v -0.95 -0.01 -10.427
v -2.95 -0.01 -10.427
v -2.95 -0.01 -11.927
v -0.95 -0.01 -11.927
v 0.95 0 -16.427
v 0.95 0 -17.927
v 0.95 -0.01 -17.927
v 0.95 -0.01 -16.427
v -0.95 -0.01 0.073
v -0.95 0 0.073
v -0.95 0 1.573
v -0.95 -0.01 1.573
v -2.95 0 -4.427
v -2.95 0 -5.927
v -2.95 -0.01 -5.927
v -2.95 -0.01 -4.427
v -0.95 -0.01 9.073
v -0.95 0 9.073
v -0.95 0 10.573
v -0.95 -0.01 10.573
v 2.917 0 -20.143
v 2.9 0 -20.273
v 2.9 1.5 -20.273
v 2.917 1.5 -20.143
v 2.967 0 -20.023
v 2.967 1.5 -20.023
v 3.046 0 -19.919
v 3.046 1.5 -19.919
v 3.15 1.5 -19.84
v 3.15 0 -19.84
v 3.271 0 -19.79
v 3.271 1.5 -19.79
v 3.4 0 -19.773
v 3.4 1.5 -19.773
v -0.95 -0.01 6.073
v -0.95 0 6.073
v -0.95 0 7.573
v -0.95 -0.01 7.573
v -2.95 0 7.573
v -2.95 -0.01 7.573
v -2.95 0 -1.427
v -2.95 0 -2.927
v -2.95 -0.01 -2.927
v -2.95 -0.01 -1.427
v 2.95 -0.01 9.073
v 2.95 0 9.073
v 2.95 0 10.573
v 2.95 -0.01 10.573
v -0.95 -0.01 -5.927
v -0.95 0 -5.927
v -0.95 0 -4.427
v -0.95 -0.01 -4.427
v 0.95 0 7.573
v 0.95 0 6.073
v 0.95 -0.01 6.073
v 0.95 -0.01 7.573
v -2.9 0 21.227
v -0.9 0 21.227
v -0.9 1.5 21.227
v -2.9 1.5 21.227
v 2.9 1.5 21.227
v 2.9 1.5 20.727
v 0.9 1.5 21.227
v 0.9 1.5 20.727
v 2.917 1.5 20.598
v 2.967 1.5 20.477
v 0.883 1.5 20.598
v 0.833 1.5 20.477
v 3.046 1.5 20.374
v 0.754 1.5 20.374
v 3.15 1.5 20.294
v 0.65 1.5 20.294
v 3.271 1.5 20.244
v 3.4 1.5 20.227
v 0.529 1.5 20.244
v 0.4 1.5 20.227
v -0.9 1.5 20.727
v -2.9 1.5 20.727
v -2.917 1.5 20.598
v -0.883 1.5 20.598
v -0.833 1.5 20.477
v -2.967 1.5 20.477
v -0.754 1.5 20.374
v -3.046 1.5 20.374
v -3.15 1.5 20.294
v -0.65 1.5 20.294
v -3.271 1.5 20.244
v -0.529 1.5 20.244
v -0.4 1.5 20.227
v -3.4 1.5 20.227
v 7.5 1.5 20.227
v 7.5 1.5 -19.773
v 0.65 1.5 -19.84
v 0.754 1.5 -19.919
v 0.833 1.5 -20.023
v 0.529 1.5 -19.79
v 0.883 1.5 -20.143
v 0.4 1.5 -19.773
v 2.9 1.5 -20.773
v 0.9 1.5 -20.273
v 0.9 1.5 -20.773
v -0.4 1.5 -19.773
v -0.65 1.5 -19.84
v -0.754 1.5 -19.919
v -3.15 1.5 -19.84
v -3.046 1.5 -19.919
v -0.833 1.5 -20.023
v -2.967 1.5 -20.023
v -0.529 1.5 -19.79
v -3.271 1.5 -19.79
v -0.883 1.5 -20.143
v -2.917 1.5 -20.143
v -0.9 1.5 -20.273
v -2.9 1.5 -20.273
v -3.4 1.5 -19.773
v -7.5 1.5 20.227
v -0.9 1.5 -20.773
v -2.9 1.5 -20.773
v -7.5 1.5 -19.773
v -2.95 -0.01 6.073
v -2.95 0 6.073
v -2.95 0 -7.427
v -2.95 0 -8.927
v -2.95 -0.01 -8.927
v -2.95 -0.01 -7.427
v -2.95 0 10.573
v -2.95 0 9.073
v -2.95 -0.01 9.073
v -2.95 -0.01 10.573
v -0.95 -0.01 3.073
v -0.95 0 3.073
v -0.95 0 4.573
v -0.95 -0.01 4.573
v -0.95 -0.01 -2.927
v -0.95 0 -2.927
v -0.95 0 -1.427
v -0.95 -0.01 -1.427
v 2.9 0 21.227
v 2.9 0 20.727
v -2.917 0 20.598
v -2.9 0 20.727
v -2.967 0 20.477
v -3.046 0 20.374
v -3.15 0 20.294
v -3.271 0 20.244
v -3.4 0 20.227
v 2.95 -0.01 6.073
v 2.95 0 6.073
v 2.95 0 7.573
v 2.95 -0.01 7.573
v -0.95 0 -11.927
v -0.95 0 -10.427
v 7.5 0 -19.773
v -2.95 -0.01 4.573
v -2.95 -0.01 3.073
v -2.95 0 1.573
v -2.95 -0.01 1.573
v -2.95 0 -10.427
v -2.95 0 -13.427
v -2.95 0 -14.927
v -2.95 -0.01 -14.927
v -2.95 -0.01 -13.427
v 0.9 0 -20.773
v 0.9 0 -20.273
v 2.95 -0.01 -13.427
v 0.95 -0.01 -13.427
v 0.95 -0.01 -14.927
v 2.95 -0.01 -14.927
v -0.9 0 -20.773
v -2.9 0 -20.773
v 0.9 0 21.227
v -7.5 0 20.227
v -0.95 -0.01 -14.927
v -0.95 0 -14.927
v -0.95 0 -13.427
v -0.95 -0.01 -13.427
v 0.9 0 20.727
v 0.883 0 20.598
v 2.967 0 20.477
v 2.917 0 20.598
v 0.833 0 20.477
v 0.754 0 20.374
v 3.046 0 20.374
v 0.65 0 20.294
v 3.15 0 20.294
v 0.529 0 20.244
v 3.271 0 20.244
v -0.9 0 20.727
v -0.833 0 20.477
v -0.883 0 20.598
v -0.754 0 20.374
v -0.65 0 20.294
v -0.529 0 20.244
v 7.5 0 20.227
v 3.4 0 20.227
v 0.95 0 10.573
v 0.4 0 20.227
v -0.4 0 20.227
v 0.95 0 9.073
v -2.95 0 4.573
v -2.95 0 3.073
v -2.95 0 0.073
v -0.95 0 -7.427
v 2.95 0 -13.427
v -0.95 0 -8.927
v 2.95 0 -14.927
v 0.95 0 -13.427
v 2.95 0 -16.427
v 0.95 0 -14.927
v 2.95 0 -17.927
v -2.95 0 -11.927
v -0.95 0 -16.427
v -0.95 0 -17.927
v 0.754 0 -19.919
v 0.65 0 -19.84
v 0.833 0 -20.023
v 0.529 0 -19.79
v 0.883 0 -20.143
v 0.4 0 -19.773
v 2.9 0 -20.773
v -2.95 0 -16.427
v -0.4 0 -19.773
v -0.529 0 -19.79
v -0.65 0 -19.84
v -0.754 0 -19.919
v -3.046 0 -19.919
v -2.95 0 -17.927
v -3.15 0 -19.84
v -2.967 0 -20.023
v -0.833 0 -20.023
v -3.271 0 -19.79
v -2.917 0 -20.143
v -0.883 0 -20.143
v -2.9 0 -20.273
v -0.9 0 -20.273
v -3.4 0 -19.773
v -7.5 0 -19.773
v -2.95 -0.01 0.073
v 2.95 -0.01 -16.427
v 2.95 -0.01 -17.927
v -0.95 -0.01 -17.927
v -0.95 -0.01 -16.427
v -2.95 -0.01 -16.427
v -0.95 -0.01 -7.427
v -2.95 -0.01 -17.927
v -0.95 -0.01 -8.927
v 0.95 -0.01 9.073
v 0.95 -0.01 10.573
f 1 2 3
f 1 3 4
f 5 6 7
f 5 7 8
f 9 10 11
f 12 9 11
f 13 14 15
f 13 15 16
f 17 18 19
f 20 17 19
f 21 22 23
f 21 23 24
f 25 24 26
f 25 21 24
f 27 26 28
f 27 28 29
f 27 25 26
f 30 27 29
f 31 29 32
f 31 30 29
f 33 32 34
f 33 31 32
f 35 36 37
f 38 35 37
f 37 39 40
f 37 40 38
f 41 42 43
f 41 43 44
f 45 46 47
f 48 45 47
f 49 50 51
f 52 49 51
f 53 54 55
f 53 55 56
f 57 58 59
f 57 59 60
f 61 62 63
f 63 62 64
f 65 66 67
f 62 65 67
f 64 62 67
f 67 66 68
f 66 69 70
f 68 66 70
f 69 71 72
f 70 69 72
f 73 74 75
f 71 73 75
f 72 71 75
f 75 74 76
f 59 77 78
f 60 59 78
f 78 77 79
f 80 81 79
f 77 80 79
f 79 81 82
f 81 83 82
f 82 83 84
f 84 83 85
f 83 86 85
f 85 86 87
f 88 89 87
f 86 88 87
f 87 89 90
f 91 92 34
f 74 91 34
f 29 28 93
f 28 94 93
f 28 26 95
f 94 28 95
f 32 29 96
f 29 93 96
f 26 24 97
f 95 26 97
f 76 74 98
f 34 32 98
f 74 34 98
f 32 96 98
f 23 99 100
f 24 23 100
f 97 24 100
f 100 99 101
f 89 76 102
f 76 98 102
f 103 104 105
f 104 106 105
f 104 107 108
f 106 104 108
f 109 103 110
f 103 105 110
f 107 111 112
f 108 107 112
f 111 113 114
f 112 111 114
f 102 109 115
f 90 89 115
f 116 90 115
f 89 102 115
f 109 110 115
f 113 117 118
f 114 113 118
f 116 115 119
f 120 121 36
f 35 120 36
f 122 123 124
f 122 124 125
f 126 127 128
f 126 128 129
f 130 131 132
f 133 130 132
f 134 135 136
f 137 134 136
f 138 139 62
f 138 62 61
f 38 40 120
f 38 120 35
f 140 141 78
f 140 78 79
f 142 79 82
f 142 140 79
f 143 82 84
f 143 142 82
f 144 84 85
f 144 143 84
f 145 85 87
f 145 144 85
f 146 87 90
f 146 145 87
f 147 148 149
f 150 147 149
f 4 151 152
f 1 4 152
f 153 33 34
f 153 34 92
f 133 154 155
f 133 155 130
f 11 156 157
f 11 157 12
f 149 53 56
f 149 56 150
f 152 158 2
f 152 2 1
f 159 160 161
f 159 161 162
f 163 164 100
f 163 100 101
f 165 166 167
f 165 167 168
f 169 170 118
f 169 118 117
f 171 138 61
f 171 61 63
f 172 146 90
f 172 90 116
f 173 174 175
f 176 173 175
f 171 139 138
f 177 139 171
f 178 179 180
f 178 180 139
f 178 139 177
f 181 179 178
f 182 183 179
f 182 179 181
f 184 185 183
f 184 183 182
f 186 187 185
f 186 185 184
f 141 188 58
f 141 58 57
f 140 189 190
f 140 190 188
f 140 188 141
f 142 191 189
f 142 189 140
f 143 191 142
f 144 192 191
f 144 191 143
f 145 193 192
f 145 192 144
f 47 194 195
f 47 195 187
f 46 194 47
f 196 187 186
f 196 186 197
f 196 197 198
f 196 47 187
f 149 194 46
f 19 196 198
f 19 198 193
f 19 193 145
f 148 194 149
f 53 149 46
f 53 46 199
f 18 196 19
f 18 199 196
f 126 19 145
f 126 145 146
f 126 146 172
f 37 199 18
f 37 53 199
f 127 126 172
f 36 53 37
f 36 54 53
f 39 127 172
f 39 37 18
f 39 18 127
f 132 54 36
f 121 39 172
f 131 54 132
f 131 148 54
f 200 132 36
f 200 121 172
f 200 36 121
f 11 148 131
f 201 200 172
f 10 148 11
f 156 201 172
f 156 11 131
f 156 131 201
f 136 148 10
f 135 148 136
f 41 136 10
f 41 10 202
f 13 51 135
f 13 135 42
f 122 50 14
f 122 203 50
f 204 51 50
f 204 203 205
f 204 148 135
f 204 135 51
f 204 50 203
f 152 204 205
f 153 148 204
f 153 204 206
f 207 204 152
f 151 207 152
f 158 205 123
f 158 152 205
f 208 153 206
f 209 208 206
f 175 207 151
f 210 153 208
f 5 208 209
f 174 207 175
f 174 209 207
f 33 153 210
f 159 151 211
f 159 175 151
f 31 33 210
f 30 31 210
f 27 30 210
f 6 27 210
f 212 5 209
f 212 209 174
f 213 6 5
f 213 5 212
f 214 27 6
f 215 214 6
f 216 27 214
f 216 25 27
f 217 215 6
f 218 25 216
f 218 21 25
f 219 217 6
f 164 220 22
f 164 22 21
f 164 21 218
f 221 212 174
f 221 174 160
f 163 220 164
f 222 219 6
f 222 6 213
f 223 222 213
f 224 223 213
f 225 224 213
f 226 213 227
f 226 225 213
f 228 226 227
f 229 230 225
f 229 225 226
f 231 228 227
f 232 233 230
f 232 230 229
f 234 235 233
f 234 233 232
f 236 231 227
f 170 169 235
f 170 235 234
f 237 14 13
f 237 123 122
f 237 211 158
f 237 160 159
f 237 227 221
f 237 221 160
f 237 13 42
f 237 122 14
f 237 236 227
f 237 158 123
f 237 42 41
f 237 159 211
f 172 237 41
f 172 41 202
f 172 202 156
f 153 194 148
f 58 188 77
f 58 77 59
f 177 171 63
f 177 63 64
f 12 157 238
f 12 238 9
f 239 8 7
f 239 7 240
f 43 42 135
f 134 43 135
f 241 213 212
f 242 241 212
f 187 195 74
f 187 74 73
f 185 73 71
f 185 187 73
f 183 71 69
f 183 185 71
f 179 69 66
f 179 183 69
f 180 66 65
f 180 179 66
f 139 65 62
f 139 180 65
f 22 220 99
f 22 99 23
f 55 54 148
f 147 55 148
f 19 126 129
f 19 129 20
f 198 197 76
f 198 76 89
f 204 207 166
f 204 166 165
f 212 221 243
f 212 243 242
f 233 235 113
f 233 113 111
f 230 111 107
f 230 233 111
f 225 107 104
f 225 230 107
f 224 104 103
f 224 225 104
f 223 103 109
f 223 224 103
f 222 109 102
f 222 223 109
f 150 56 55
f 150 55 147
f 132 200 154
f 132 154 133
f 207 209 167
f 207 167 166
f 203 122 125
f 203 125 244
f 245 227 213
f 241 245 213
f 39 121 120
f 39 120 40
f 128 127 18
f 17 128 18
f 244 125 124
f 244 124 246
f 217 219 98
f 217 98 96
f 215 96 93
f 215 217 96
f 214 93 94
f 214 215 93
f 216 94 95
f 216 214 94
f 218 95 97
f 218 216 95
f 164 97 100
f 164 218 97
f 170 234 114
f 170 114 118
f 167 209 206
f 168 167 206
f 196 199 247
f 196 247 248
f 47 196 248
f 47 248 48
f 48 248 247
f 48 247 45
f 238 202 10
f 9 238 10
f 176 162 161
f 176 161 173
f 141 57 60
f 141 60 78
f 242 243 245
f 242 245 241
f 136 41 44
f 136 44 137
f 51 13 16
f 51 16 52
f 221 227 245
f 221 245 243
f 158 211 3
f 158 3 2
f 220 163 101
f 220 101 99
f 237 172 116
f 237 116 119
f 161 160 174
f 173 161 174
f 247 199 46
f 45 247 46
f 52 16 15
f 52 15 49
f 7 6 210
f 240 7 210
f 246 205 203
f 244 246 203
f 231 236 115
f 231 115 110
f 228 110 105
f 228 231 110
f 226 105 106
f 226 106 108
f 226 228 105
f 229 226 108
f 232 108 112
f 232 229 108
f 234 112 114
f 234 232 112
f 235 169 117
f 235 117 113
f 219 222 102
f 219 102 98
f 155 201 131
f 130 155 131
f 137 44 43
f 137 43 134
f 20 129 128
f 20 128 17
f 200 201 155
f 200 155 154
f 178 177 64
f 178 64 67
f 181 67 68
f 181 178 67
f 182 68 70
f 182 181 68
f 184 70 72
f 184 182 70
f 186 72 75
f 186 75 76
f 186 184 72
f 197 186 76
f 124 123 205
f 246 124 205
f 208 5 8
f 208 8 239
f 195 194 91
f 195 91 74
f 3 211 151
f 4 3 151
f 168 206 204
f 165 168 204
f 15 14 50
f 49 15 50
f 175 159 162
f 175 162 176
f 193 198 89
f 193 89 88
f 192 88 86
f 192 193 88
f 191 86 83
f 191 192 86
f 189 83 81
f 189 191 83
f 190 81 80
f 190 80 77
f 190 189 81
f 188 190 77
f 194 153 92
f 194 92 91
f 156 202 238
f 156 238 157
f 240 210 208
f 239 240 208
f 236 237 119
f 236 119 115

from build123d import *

# Parameters (mm, degrees)
BOSS_EXTRUDE1_DEPTH = 1.5
SKETCH2_W           = 2
SKETCH2_H           = 1.5
BOSS_EXTRUDE2_DEPTH = 0.01


with BuildPart() as part:
    # Sketch1 → Boss-Extrude1 (new body)
    with BuildSketch(Plane(origin=(0, 0, 0), x_dir=(1, 0, 0), z_dir=(0, 1, 0))):
        with BuildLine():
            Line((-7.5, -20.227321531), (-7.5, 19.772678469))
            Line((-7.5, 19.772678469), (-3.4, 19.772678469))
            ThreePointArc((-3.4, 19.772678469), (-3.046446609, 19.919125079), (-2.9, 20.272678469))
            Line((-2.9, 20.272678469), (-2.9, 20.772678469))
            Line((-2.9, 20.772678469), (-0.9, 20.772678469))
            Line((-0.9, 20.772678469), (-0.9, 20.272678469))
            ThreePointArc((-0.9, 20.272678469), (-0.753553391, 19.919125079), (-0.4, 19.772678469))
            Line((-0.4, 19.772678469), (0.4, 19.772678469))
            ThreePointArc((0.4, 19.772678469), (0.753553391, 19.919125079), (0.9, 20.272678469))
            Line((0.9, 20.272678469), (0.9, 20.772678469))
            Line((0.9, 20.772678469), (2.9, 20.772678469))
            Line((2.9, 20.772678469), (2.9, 20.272678469))
            ThreePointArc((2.9, 20.272678469), (3.046446609, 19.919125079), (3.4, 19.772678469))
            Line((3.4, 19.772678469), (7.5, 19.772678469))
            Line((7.5, 19.772678469), (7.5, -20.227321531))
            Line((7.5, -20.227321531), (3.4, -20.227321531))
            ThreePointArc((3.4, -20.227321531), (3.046446609, -20.37376814), (2.9, -20.727321531))
            Line((2.9, -20.727321531), (2.9, -21.227321531))
            Line((2.9, -21.227321531), (0.9, -21.227321531))
            Line((0.9, -21.227321531), (0.9, -20.727321531))
            ThreePointArc((0.9, -20.727321531), (0.753553391, -20.37376814), (0.4, -20.227321531))
            Line((0.4, -20.227321531), (-0.4, -20.227321531))
            ThreePointArc((-0.4, -20.227321531), (-0.753553391, -20.37376814), (-0.9, -20.727321531))
            Line((-0.9, -20.727321531), (-0.9, -21.227321531))
            Line((-0.9, -21.227321531), (-2.9, -21.227321531))
            Line((-2.9, -21.227321531), (-2.9, -20.727321531))
            ThreePointArc((-2.9, -20.727321531), (-3.046446609, -20.37376814), (-3.4, -20.227321531))
            Line((-3.4, -20.227321531), (-7.5, -20.227321531))
        make_face()
    extrude(amount=BOSS_EXTRUDE1_DEPTH)

    # Sketch2 → Boss-Extrude2 (add)
    with BuildSketch(Plane.XZ):
        with Locations((-1.95, -17.177321531)):
            Rectangle(SKETCH2_W, SKETCH2_H)
        with Locations((1.95, -17.177321531)):
            Rectangle(SKETCH2_W, SKETCH2_H)
        with Locations((-1.95, -14.177321531)):
            Rectangle(SKETCH2_W, SKETCH2_H)
        with Locations((1.95, -14.177321531)):
            Rectangle(SKETCH2_W, SKETCH2_H)
        with Locations((-1.95, -11.177321531)):
            Rectangle(SKETCH2_W, SKETCH2_H)
        with Locations((-1.95, -8.177321531)):
            Rectangle(SKETCH2_W, SKETCH2_H)
        with Locations((-1.95, -5.177321531)):
            Rectangle(SKETCH2_W, SKETCH2_H)
        with Locations((-1.95, -2.177321531)):
            Rectangle(SKETCH2_W, SKETCH2_H)
        with Locations((-1.95, 0.822678469)):
            Rectangle(SKETCH2_W, SKETCH2_H)
        with Locations((-1.95, 3.822678469)):
            Rectangle(SKETCH2_W, SKETCH2_H)
        with Locations((-1.95, 6.822678469)):
            Rectangle(SKETCH2_W, SKETCH2_H)
        with Locations((1.95, 6.822678469)):
            Rectangle(SKETCH2_W, SKETCH2_H)
        with Locations((-1.95, 9.822678469)):
            Rectangle(SKETCH2_W, SKETCH2_H)
        with Locations((1.95, 9.822678469)):
            Rectangle(SKETCH2_W, SKETCH2_H)
    extrude(amount=BOSS_EXTRUDE2_DEPTH)


solid = part.part
